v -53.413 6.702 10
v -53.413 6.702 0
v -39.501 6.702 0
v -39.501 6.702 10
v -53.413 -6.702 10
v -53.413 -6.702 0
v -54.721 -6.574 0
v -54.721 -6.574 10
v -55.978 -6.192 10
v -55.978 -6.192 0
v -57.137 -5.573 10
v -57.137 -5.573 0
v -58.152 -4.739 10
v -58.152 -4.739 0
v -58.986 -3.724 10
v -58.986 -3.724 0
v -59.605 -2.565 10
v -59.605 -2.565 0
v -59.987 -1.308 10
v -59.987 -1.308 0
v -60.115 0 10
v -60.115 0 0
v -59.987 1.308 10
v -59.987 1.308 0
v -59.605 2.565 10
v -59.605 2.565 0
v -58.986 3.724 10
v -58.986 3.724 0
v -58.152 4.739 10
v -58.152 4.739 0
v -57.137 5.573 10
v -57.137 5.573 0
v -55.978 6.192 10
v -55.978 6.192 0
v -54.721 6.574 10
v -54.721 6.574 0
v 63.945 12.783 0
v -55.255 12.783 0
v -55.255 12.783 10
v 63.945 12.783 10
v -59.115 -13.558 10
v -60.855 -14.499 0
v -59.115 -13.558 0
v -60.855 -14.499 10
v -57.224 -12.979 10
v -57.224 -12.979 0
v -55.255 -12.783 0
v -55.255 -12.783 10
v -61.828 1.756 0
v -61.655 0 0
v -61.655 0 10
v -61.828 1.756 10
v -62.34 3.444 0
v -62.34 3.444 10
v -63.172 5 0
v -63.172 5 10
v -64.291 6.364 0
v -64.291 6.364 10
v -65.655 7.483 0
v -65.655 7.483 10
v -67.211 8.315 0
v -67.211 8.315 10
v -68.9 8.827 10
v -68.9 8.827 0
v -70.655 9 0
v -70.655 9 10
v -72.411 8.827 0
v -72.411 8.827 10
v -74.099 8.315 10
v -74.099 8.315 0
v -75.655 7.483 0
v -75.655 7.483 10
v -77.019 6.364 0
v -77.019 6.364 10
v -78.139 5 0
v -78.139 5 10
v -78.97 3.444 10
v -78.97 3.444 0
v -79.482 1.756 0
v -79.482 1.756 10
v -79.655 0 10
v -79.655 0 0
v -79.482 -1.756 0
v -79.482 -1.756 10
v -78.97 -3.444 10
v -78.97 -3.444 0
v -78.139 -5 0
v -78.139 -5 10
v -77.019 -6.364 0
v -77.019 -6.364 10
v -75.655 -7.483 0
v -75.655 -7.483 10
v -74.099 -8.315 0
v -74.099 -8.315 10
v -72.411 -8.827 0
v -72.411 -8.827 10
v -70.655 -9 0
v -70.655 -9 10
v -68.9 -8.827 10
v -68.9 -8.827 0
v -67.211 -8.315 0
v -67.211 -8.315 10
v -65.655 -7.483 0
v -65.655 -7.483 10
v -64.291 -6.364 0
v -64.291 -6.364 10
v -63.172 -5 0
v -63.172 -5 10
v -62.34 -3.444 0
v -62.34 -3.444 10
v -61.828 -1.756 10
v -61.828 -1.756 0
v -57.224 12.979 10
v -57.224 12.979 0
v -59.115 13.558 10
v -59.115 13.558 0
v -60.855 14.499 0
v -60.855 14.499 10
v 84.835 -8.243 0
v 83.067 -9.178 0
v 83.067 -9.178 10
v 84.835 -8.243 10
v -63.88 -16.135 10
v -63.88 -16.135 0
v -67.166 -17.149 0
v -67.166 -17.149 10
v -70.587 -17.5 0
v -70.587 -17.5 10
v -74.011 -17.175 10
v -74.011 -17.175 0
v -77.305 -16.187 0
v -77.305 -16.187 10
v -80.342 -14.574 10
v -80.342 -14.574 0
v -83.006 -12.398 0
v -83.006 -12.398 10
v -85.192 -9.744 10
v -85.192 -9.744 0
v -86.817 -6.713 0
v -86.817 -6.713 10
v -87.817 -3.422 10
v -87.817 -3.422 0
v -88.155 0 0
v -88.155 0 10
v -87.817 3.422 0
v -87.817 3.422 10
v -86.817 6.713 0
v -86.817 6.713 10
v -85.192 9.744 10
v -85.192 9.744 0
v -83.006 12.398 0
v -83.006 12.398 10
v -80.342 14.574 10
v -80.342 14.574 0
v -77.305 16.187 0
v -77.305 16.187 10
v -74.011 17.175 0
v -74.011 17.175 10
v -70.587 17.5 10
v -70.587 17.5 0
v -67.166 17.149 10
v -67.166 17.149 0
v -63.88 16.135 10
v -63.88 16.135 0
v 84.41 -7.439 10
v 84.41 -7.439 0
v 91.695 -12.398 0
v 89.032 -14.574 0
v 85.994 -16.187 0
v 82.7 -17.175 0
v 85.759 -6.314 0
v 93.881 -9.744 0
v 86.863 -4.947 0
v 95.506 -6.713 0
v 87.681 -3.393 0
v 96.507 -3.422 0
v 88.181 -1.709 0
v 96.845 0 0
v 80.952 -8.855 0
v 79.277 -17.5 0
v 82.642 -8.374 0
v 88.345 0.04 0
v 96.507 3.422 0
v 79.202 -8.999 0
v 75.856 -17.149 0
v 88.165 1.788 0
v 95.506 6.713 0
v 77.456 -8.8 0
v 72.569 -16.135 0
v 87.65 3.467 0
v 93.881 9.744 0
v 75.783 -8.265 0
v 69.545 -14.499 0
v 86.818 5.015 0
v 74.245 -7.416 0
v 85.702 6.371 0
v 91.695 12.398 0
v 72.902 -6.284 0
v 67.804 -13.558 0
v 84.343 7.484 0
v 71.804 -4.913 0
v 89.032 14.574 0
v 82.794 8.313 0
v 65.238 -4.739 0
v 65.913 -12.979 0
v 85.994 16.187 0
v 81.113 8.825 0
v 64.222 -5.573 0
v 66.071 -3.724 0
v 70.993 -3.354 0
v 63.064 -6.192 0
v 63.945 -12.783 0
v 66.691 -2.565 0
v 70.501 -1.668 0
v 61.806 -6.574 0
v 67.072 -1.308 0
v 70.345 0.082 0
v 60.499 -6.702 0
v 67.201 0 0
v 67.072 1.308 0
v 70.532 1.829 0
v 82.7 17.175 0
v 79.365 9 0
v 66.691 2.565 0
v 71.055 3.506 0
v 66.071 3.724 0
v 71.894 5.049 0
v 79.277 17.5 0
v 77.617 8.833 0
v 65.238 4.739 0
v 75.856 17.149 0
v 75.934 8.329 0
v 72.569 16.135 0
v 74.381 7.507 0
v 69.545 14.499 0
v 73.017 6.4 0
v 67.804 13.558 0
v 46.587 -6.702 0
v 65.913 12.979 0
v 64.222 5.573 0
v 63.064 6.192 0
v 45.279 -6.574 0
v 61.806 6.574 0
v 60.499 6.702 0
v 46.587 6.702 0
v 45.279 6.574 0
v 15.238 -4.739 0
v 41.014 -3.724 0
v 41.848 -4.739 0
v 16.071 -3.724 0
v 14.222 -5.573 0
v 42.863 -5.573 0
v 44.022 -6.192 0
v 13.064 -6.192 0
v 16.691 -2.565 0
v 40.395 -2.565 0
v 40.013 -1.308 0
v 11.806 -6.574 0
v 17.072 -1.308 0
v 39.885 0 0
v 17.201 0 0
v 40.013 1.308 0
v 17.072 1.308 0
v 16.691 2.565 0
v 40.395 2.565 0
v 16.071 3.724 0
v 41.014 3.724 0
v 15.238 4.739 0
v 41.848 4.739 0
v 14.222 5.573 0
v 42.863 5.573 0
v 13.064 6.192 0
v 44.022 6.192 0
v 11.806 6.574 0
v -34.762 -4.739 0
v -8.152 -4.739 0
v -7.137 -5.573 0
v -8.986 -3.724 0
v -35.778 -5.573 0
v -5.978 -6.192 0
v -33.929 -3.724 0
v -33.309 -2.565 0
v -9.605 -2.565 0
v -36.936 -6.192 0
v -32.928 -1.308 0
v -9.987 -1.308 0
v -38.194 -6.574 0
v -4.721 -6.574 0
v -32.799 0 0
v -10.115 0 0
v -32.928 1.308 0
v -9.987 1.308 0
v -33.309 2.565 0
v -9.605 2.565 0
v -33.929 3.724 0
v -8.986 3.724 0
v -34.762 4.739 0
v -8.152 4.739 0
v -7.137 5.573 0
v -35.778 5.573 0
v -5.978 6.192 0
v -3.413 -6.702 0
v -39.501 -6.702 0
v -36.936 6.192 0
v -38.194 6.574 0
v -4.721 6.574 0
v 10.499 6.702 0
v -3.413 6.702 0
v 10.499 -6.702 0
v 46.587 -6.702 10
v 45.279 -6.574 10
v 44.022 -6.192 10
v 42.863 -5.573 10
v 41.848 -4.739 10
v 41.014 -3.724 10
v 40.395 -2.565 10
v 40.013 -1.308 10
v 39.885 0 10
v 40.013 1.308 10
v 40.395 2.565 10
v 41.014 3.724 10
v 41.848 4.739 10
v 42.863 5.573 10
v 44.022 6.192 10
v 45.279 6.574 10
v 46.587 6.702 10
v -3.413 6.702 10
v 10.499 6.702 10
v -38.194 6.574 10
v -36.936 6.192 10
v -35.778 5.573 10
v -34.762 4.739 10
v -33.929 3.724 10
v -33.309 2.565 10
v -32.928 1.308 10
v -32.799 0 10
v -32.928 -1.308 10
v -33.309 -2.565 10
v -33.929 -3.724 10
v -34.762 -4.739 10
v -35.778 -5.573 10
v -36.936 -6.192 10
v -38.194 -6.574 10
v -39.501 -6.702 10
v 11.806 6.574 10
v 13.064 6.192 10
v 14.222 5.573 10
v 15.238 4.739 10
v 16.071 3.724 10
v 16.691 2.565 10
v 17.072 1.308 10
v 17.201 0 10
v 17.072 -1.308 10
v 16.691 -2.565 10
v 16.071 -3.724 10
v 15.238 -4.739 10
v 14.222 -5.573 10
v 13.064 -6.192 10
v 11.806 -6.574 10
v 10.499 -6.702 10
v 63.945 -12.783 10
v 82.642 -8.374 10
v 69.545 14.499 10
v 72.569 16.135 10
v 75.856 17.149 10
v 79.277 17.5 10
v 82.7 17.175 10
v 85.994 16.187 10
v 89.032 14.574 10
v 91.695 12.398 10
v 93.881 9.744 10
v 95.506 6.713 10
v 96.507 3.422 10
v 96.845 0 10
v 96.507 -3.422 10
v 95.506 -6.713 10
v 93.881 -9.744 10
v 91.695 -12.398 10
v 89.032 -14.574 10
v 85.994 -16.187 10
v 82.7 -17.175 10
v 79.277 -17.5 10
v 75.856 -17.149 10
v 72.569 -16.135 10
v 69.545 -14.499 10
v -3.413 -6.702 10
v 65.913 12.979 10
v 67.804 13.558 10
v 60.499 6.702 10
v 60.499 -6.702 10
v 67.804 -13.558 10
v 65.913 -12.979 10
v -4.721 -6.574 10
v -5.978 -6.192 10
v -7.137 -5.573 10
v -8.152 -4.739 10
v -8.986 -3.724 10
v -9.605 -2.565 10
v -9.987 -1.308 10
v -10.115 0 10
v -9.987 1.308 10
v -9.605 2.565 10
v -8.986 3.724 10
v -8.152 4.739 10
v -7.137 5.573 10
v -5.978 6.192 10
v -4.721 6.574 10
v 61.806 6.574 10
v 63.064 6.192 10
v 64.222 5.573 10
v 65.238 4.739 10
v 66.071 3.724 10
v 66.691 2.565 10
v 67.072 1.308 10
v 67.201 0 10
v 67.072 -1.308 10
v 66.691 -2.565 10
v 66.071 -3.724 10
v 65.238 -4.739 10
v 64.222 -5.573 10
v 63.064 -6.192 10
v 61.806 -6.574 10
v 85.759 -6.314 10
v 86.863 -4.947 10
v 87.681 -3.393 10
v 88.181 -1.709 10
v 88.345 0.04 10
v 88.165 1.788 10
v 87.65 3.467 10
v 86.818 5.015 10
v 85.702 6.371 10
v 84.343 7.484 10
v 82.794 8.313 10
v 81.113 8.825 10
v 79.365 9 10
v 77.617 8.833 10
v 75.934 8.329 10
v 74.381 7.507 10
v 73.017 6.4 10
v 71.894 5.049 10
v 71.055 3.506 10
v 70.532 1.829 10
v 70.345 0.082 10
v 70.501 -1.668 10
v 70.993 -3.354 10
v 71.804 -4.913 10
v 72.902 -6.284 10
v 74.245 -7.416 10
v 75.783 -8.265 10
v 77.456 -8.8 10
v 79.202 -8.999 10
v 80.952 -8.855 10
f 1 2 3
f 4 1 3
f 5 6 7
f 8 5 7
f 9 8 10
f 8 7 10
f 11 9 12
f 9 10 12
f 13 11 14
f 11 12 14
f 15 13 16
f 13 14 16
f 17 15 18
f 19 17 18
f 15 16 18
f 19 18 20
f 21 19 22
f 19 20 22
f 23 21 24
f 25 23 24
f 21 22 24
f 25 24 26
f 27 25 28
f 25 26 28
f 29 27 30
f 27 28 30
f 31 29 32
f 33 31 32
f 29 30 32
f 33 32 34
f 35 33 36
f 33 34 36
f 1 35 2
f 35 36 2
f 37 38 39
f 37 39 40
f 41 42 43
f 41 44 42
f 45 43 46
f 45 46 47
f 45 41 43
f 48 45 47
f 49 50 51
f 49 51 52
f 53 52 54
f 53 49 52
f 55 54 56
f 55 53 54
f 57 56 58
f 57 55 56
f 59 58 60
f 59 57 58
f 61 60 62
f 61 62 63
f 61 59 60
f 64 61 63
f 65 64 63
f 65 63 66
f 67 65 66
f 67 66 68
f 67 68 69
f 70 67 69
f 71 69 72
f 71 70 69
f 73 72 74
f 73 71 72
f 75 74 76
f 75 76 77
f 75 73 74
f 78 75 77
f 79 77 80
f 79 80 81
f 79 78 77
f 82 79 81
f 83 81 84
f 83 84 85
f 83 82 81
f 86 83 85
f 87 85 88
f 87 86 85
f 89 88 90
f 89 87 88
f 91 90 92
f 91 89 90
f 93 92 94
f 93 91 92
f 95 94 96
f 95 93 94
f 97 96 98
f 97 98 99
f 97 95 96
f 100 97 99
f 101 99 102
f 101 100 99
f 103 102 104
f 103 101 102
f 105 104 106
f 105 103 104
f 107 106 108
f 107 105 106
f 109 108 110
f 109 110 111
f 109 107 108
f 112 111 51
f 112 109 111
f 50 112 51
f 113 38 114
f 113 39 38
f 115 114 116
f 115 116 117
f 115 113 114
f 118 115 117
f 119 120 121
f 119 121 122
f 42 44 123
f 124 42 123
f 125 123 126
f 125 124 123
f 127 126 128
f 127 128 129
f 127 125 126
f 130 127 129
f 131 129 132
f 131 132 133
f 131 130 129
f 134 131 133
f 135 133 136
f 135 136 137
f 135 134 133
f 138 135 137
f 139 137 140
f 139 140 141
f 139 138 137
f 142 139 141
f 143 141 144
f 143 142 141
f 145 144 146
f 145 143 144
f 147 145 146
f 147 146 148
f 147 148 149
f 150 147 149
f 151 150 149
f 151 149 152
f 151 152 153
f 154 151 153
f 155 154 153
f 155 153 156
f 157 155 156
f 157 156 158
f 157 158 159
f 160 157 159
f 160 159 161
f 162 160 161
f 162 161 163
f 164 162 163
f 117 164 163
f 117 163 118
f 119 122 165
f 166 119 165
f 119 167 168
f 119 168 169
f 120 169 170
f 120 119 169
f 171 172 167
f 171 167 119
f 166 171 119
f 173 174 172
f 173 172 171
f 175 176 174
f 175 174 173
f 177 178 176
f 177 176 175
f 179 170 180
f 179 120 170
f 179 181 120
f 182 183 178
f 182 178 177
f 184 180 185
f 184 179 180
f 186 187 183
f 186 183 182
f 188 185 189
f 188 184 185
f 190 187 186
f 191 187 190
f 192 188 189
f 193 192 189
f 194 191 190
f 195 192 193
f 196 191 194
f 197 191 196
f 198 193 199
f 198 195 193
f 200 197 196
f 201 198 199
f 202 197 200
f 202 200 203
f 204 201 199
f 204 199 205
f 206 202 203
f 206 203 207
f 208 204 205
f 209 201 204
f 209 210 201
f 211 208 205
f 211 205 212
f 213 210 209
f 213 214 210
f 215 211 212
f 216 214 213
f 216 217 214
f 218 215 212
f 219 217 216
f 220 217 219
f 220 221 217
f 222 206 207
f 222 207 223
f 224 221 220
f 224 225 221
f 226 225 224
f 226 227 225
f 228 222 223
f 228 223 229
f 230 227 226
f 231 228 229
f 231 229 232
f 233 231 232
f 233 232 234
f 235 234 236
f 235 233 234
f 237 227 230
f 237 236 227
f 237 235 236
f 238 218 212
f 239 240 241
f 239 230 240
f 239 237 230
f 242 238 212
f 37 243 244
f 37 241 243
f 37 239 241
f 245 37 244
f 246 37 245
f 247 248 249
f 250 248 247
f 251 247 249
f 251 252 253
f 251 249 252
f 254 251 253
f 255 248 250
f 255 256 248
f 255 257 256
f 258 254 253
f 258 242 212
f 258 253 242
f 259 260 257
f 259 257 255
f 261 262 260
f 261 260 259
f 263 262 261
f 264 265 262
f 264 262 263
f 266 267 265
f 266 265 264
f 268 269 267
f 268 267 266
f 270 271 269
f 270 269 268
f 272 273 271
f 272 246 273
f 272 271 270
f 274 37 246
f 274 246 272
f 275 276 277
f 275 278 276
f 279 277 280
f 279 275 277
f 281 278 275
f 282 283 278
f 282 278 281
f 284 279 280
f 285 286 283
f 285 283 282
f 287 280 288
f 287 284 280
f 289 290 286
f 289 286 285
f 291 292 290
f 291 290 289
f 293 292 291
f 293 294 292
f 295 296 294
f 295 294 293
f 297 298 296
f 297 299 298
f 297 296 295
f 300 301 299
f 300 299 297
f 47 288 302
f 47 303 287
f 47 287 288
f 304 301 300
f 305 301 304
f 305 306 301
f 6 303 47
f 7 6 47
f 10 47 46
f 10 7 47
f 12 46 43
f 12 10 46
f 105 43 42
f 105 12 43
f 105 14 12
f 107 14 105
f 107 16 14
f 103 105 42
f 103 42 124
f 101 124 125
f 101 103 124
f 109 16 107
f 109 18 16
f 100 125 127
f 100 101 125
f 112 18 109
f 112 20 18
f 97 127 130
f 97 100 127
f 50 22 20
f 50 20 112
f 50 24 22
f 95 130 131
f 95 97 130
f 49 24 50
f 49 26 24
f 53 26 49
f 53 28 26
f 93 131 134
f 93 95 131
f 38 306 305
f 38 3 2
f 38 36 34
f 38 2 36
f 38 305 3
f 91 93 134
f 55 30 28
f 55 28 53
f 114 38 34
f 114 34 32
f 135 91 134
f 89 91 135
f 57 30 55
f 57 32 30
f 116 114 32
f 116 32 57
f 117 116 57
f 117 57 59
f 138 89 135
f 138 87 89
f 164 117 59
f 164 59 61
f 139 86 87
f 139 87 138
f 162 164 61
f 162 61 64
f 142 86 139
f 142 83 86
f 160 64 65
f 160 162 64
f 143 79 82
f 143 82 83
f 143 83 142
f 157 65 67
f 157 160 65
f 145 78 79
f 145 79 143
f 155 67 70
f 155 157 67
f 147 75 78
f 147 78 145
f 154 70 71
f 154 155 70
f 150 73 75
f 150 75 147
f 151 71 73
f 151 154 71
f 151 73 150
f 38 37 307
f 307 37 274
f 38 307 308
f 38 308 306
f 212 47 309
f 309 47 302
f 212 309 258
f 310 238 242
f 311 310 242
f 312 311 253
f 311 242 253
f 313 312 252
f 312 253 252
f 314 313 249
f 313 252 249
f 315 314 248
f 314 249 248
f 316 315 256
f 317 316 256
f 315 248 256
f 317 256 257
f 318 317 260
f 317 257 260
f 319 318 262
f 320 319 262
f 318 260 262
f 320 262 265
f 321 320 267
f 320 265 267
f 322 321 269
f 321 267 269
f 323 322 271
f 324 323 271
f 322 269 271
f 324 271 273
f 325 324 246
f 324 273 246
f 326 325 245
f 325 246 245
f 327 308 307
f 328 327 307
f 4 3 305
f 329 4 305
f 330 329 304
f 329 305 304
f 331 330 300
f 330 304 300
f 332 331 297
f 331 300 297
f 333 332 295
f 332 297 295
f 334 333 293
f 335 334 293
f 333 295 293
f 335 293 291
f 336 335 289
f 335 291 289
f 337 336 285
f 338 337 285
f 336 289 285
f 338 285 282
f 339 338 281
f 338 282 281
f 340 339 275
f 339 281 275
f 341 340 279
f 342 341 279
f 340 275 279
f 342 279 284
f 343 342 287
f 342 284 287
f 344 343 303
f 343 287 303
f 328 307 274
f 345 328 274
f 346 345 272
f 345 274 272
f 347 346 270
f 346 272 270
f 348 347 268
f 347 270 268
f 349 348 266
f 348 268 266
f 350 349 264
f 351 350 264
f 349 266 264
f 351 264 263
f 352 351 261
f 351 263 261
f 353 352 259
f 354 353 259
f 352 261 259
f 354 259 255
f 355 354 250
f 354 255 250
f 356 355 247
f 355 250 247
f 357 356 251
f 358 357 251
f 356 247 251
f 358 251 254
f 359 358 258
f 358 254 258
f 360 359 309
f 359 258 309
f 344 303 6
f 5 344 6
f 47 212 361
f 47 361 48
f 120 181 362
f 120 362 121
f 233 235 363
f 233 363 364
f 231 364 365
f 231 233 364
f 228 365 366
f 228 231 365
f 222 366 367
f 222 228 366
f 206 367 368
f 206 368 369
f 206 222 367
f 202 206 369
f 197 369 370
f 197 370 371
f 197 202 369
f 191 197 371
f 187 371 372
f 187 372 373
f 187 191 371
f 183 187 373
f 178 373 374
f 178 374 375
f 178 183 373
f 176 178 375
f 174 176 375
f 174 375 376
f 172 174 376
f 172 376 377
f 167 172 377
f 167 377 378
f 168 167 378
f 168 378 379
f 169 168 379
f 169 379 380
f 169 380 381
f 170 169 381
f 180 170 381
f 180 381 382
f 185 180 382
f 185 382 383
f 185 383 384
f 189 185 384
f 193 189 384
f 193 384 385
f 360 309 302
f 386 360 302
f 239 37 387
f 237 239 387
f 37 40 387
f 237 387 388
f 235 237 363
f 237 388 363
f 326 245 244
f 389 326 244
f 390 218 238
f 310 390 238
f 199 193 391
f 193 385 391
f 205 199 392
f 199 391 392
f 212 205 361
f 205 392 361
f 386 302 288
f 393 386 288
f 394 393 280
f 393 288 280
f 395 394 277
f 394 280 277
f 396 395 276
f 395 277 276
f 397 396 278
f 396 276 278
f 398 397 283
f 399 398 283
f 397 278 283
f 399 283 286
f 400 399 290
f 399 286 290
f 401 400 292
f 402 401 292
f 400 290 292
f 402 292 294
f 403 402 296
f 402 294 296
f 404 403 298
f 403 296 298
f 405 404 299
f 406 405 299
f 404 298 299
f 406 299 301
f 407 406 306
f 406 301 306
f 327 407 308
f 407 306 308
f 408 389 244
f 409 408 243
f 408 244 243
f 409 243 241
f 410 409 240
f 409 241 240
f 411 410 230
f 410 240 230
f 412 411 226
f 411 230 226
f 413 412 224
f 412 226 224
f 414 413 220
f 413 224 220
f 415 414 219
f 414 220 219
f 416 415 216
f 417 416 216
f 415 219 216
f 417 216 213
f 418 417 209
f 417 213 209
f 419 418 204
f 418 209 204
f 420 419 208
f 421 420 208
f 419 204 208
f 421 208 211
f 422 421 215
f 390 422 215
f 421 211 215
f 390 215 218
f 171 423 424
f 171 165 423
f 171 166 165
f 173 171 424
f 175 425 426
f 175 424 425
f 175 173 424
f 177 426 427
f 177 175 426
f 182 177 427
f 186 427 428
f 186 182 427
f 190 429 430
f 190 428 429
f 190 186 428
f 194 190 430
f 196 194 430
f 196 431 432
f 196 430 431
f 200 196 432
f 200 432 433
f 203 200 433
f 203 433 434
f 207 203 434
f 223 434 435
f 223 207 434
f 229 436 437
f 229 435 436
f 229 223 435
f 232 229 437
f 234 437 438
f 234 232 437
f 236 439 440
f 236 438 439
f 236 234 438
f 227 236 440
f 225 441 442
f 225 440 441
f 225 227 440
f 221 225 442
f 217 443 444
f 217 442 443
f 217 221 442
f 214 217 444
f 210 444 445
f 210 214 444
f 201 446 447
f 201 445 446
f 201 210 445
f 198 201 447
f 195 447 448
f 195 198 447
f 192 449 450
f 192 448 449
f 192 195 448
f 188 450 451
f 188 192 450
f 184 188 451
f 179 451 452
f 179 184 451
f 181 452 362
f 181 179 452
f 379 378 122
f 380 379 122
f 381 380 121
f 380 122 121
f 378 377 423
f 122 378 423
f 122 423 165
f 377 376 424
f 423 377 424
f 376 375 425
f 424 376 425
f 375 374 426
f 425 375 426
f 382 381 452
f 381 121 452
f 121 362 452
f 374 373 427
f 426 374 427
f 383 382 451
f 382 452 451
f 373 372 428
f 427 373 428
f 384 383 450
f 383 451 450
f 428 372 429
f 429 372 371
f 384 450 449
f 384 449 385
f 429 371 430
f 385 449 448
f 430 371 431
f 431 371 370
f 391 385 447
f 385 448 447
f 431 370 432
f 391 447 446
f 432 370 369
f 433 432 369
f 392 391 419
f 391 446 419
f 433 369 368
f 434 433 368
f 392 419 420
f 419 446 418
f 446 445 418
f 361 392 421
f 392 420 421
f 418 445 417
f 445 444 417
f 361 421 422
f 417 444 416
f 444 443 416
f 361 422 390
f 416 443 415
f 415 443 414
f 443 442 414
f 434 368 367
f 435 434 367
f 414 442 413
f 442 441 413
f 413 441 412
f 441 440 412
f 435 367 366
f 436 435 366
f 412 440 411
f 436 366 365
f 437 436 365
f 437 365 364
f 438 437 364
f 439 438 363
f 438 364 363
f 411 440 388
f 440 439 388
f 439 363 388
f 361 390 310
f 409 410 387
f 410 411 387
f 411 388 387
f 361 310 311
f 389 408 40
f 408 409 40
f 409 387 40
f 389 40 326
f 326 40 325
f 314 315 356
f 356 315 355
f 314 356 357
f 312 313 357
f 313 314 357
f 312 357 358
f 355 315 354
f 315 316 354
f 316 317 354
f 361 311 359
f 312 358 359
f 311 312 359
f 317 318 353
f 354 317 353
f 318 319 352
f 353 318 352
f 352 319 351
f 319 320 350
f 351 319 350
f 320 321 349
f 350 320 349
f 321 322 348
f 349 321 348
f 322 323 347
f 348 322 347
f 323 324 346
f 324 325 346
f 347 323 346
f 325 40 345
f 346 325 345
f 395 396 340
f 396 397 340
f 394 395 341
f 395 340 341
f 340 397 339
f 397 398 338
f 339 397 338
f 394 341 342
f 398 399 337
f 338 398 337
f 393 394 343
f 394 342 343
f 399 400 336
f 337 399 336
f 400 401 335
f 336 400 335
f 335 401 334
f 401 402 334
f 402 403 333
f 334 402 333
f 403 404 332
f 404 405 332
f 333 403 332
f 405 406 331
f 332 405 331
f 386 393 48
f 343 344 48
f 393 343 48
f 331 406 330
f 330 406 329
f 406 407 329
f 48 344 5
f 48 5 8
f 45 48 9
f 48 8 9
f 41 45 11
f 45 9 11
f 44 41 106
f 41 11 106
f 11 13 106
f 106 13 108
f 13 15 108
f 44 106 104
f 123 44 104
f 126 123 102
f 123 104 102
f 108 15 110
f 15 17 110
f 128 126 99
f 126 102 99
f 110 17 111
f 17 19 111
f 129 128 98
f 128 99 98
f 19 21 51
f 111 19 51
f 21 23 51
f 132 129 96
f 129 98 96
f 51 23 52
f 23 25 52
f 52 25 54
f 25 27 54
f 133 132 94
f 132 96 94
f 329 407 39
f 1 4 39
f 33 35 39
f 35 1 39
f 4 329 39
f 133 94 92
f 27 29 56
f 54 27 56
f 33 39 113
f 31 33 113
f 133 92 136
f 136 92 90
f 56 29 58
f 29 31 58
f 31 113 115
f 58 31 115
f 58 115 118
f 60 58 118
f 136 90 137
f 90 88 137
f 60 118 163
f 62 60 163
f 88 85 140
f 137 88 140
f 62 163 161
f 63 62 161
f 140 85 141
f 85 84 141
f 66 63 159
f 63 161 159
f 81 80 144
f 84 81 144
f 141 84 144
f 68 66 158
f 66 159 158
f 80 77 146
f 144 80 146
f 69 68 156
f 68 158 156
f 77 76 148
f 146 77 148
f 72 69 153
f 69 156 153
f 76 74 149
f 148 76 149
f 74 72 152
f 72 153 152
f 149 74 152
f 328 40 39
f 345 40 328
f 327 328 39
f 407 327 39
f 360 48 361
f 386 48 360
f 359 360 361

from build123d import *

# Parameters (mm, degrees)
SKETCH1_R           = 9
BOSS_EXTRUDE3_DEPTH = 10
FILLET1_R           = 10
CUT_EXTRUDE2_DEPTH  = 10


with BuildPart() as part:
    # Sketch1 → Boss-Extrude3 (new body)
    with BuildSketch(Plane.XY):
        with BuildLine():
            Line((-58.704034486, 12.783450444), (67.393380319, 12.783450444))
            ThreePointArc((67.393380319, 12.783450444), (96.844672917, 0), (67.393380319, -12.783450444))
            Line((67.393380319, -12.783450444), (-58.704034486, -12.783450444))
            ThreePointArc((-58.704034486, -12.783450444), (-88.155327083, 0), (-58.704034486, 12.783450444))
        make_face()
        with Locations((-70.655327083, 0)):
            Circle(SKETCH1_R, mode=Mode.SUBTRACT)
        with Locations((79.344672917, 0)):
            Circle(SKETCH1_R, mode=Mode.SUBTRACT)
        with BuildLine():
            Line((-53.412978839, 6.702415671), (-39.501397037, 6.702415671))
            ThreePointArc((-39.501397037, 6.702415671), (-32.798981366, 0), (-39.501397037, -6.702415671))
            Line((-39.501397037, -6.702415671), (-53.412978839, -6.702415671))
            ThreePointArc((-53.412978839, -6.702415671), (-60.11539451, 0), (-53.412978839, 6.702415671))
        make_face(mode=Mode.SUBTRACT)
        with BuildLine():
            Line((-3.412978839, 6.702415671), (10.498602963, 6.702415671))
            ThreePointArc((10.498602963, 6.702415671), (17.201018634, 0), (10.498602963, -6.702415671))
            Line((10.498602963, -6.702415671), (-3.412978839, -6.702415671))
            ThreePointArc((-3.412978839, -6.702415671), (-10.11539451, 0), (-3.412978839, 6.702415671))
        make_face(mode=Mode.SUBTRACT)
        with BuildLine():
            Line((46.587021161, 6.702415671), (60.498602963, 6.702415671))
            ThreePointArc((60.498602963, 6.702415671), (67.201018634, 0), (60.498602963, -6.702415671))
            Line((60.498602963, -6.702415671), (46.587021161, -6.702415671))
            ThreePointArc((46.587021161, -6.702415671), (39.88460549, 0), (46.587021161, 6.702415671))
        make_face(mode=Mode.SUBTRACT)
    extrude(amount=BOSS_EXTRUDE3_DEPTH)

    # Fillet1
    fillet1_edges = [part.edges().sort_by_distance(p)[0] for p in [
        (67.393380319, -12.783450444, 5),
        (-58.704034486, -12.783450444, 5),
        (-58.704034486, 12.783450444, 5),
        (67.393380319, 12.783450444, 5),
    ]]
    fillet(fillet1_edges, radius=FILLET1_R)

    # Sketch4 → Cut-Extrude2 (cut)
    with BuildSketch(Plane.XY.offset(10)):
        Polygon((82.625844791, -8.343662686), (83.067179358, -9.178208957), (84.835179052, -8.243234581), (84.393844485, -7.40868831), align=None)
    extrude(amount=-CUT_EXTRUDE2_DEPTH, mode=Mode.SUBTRACT)


solid = part.part
